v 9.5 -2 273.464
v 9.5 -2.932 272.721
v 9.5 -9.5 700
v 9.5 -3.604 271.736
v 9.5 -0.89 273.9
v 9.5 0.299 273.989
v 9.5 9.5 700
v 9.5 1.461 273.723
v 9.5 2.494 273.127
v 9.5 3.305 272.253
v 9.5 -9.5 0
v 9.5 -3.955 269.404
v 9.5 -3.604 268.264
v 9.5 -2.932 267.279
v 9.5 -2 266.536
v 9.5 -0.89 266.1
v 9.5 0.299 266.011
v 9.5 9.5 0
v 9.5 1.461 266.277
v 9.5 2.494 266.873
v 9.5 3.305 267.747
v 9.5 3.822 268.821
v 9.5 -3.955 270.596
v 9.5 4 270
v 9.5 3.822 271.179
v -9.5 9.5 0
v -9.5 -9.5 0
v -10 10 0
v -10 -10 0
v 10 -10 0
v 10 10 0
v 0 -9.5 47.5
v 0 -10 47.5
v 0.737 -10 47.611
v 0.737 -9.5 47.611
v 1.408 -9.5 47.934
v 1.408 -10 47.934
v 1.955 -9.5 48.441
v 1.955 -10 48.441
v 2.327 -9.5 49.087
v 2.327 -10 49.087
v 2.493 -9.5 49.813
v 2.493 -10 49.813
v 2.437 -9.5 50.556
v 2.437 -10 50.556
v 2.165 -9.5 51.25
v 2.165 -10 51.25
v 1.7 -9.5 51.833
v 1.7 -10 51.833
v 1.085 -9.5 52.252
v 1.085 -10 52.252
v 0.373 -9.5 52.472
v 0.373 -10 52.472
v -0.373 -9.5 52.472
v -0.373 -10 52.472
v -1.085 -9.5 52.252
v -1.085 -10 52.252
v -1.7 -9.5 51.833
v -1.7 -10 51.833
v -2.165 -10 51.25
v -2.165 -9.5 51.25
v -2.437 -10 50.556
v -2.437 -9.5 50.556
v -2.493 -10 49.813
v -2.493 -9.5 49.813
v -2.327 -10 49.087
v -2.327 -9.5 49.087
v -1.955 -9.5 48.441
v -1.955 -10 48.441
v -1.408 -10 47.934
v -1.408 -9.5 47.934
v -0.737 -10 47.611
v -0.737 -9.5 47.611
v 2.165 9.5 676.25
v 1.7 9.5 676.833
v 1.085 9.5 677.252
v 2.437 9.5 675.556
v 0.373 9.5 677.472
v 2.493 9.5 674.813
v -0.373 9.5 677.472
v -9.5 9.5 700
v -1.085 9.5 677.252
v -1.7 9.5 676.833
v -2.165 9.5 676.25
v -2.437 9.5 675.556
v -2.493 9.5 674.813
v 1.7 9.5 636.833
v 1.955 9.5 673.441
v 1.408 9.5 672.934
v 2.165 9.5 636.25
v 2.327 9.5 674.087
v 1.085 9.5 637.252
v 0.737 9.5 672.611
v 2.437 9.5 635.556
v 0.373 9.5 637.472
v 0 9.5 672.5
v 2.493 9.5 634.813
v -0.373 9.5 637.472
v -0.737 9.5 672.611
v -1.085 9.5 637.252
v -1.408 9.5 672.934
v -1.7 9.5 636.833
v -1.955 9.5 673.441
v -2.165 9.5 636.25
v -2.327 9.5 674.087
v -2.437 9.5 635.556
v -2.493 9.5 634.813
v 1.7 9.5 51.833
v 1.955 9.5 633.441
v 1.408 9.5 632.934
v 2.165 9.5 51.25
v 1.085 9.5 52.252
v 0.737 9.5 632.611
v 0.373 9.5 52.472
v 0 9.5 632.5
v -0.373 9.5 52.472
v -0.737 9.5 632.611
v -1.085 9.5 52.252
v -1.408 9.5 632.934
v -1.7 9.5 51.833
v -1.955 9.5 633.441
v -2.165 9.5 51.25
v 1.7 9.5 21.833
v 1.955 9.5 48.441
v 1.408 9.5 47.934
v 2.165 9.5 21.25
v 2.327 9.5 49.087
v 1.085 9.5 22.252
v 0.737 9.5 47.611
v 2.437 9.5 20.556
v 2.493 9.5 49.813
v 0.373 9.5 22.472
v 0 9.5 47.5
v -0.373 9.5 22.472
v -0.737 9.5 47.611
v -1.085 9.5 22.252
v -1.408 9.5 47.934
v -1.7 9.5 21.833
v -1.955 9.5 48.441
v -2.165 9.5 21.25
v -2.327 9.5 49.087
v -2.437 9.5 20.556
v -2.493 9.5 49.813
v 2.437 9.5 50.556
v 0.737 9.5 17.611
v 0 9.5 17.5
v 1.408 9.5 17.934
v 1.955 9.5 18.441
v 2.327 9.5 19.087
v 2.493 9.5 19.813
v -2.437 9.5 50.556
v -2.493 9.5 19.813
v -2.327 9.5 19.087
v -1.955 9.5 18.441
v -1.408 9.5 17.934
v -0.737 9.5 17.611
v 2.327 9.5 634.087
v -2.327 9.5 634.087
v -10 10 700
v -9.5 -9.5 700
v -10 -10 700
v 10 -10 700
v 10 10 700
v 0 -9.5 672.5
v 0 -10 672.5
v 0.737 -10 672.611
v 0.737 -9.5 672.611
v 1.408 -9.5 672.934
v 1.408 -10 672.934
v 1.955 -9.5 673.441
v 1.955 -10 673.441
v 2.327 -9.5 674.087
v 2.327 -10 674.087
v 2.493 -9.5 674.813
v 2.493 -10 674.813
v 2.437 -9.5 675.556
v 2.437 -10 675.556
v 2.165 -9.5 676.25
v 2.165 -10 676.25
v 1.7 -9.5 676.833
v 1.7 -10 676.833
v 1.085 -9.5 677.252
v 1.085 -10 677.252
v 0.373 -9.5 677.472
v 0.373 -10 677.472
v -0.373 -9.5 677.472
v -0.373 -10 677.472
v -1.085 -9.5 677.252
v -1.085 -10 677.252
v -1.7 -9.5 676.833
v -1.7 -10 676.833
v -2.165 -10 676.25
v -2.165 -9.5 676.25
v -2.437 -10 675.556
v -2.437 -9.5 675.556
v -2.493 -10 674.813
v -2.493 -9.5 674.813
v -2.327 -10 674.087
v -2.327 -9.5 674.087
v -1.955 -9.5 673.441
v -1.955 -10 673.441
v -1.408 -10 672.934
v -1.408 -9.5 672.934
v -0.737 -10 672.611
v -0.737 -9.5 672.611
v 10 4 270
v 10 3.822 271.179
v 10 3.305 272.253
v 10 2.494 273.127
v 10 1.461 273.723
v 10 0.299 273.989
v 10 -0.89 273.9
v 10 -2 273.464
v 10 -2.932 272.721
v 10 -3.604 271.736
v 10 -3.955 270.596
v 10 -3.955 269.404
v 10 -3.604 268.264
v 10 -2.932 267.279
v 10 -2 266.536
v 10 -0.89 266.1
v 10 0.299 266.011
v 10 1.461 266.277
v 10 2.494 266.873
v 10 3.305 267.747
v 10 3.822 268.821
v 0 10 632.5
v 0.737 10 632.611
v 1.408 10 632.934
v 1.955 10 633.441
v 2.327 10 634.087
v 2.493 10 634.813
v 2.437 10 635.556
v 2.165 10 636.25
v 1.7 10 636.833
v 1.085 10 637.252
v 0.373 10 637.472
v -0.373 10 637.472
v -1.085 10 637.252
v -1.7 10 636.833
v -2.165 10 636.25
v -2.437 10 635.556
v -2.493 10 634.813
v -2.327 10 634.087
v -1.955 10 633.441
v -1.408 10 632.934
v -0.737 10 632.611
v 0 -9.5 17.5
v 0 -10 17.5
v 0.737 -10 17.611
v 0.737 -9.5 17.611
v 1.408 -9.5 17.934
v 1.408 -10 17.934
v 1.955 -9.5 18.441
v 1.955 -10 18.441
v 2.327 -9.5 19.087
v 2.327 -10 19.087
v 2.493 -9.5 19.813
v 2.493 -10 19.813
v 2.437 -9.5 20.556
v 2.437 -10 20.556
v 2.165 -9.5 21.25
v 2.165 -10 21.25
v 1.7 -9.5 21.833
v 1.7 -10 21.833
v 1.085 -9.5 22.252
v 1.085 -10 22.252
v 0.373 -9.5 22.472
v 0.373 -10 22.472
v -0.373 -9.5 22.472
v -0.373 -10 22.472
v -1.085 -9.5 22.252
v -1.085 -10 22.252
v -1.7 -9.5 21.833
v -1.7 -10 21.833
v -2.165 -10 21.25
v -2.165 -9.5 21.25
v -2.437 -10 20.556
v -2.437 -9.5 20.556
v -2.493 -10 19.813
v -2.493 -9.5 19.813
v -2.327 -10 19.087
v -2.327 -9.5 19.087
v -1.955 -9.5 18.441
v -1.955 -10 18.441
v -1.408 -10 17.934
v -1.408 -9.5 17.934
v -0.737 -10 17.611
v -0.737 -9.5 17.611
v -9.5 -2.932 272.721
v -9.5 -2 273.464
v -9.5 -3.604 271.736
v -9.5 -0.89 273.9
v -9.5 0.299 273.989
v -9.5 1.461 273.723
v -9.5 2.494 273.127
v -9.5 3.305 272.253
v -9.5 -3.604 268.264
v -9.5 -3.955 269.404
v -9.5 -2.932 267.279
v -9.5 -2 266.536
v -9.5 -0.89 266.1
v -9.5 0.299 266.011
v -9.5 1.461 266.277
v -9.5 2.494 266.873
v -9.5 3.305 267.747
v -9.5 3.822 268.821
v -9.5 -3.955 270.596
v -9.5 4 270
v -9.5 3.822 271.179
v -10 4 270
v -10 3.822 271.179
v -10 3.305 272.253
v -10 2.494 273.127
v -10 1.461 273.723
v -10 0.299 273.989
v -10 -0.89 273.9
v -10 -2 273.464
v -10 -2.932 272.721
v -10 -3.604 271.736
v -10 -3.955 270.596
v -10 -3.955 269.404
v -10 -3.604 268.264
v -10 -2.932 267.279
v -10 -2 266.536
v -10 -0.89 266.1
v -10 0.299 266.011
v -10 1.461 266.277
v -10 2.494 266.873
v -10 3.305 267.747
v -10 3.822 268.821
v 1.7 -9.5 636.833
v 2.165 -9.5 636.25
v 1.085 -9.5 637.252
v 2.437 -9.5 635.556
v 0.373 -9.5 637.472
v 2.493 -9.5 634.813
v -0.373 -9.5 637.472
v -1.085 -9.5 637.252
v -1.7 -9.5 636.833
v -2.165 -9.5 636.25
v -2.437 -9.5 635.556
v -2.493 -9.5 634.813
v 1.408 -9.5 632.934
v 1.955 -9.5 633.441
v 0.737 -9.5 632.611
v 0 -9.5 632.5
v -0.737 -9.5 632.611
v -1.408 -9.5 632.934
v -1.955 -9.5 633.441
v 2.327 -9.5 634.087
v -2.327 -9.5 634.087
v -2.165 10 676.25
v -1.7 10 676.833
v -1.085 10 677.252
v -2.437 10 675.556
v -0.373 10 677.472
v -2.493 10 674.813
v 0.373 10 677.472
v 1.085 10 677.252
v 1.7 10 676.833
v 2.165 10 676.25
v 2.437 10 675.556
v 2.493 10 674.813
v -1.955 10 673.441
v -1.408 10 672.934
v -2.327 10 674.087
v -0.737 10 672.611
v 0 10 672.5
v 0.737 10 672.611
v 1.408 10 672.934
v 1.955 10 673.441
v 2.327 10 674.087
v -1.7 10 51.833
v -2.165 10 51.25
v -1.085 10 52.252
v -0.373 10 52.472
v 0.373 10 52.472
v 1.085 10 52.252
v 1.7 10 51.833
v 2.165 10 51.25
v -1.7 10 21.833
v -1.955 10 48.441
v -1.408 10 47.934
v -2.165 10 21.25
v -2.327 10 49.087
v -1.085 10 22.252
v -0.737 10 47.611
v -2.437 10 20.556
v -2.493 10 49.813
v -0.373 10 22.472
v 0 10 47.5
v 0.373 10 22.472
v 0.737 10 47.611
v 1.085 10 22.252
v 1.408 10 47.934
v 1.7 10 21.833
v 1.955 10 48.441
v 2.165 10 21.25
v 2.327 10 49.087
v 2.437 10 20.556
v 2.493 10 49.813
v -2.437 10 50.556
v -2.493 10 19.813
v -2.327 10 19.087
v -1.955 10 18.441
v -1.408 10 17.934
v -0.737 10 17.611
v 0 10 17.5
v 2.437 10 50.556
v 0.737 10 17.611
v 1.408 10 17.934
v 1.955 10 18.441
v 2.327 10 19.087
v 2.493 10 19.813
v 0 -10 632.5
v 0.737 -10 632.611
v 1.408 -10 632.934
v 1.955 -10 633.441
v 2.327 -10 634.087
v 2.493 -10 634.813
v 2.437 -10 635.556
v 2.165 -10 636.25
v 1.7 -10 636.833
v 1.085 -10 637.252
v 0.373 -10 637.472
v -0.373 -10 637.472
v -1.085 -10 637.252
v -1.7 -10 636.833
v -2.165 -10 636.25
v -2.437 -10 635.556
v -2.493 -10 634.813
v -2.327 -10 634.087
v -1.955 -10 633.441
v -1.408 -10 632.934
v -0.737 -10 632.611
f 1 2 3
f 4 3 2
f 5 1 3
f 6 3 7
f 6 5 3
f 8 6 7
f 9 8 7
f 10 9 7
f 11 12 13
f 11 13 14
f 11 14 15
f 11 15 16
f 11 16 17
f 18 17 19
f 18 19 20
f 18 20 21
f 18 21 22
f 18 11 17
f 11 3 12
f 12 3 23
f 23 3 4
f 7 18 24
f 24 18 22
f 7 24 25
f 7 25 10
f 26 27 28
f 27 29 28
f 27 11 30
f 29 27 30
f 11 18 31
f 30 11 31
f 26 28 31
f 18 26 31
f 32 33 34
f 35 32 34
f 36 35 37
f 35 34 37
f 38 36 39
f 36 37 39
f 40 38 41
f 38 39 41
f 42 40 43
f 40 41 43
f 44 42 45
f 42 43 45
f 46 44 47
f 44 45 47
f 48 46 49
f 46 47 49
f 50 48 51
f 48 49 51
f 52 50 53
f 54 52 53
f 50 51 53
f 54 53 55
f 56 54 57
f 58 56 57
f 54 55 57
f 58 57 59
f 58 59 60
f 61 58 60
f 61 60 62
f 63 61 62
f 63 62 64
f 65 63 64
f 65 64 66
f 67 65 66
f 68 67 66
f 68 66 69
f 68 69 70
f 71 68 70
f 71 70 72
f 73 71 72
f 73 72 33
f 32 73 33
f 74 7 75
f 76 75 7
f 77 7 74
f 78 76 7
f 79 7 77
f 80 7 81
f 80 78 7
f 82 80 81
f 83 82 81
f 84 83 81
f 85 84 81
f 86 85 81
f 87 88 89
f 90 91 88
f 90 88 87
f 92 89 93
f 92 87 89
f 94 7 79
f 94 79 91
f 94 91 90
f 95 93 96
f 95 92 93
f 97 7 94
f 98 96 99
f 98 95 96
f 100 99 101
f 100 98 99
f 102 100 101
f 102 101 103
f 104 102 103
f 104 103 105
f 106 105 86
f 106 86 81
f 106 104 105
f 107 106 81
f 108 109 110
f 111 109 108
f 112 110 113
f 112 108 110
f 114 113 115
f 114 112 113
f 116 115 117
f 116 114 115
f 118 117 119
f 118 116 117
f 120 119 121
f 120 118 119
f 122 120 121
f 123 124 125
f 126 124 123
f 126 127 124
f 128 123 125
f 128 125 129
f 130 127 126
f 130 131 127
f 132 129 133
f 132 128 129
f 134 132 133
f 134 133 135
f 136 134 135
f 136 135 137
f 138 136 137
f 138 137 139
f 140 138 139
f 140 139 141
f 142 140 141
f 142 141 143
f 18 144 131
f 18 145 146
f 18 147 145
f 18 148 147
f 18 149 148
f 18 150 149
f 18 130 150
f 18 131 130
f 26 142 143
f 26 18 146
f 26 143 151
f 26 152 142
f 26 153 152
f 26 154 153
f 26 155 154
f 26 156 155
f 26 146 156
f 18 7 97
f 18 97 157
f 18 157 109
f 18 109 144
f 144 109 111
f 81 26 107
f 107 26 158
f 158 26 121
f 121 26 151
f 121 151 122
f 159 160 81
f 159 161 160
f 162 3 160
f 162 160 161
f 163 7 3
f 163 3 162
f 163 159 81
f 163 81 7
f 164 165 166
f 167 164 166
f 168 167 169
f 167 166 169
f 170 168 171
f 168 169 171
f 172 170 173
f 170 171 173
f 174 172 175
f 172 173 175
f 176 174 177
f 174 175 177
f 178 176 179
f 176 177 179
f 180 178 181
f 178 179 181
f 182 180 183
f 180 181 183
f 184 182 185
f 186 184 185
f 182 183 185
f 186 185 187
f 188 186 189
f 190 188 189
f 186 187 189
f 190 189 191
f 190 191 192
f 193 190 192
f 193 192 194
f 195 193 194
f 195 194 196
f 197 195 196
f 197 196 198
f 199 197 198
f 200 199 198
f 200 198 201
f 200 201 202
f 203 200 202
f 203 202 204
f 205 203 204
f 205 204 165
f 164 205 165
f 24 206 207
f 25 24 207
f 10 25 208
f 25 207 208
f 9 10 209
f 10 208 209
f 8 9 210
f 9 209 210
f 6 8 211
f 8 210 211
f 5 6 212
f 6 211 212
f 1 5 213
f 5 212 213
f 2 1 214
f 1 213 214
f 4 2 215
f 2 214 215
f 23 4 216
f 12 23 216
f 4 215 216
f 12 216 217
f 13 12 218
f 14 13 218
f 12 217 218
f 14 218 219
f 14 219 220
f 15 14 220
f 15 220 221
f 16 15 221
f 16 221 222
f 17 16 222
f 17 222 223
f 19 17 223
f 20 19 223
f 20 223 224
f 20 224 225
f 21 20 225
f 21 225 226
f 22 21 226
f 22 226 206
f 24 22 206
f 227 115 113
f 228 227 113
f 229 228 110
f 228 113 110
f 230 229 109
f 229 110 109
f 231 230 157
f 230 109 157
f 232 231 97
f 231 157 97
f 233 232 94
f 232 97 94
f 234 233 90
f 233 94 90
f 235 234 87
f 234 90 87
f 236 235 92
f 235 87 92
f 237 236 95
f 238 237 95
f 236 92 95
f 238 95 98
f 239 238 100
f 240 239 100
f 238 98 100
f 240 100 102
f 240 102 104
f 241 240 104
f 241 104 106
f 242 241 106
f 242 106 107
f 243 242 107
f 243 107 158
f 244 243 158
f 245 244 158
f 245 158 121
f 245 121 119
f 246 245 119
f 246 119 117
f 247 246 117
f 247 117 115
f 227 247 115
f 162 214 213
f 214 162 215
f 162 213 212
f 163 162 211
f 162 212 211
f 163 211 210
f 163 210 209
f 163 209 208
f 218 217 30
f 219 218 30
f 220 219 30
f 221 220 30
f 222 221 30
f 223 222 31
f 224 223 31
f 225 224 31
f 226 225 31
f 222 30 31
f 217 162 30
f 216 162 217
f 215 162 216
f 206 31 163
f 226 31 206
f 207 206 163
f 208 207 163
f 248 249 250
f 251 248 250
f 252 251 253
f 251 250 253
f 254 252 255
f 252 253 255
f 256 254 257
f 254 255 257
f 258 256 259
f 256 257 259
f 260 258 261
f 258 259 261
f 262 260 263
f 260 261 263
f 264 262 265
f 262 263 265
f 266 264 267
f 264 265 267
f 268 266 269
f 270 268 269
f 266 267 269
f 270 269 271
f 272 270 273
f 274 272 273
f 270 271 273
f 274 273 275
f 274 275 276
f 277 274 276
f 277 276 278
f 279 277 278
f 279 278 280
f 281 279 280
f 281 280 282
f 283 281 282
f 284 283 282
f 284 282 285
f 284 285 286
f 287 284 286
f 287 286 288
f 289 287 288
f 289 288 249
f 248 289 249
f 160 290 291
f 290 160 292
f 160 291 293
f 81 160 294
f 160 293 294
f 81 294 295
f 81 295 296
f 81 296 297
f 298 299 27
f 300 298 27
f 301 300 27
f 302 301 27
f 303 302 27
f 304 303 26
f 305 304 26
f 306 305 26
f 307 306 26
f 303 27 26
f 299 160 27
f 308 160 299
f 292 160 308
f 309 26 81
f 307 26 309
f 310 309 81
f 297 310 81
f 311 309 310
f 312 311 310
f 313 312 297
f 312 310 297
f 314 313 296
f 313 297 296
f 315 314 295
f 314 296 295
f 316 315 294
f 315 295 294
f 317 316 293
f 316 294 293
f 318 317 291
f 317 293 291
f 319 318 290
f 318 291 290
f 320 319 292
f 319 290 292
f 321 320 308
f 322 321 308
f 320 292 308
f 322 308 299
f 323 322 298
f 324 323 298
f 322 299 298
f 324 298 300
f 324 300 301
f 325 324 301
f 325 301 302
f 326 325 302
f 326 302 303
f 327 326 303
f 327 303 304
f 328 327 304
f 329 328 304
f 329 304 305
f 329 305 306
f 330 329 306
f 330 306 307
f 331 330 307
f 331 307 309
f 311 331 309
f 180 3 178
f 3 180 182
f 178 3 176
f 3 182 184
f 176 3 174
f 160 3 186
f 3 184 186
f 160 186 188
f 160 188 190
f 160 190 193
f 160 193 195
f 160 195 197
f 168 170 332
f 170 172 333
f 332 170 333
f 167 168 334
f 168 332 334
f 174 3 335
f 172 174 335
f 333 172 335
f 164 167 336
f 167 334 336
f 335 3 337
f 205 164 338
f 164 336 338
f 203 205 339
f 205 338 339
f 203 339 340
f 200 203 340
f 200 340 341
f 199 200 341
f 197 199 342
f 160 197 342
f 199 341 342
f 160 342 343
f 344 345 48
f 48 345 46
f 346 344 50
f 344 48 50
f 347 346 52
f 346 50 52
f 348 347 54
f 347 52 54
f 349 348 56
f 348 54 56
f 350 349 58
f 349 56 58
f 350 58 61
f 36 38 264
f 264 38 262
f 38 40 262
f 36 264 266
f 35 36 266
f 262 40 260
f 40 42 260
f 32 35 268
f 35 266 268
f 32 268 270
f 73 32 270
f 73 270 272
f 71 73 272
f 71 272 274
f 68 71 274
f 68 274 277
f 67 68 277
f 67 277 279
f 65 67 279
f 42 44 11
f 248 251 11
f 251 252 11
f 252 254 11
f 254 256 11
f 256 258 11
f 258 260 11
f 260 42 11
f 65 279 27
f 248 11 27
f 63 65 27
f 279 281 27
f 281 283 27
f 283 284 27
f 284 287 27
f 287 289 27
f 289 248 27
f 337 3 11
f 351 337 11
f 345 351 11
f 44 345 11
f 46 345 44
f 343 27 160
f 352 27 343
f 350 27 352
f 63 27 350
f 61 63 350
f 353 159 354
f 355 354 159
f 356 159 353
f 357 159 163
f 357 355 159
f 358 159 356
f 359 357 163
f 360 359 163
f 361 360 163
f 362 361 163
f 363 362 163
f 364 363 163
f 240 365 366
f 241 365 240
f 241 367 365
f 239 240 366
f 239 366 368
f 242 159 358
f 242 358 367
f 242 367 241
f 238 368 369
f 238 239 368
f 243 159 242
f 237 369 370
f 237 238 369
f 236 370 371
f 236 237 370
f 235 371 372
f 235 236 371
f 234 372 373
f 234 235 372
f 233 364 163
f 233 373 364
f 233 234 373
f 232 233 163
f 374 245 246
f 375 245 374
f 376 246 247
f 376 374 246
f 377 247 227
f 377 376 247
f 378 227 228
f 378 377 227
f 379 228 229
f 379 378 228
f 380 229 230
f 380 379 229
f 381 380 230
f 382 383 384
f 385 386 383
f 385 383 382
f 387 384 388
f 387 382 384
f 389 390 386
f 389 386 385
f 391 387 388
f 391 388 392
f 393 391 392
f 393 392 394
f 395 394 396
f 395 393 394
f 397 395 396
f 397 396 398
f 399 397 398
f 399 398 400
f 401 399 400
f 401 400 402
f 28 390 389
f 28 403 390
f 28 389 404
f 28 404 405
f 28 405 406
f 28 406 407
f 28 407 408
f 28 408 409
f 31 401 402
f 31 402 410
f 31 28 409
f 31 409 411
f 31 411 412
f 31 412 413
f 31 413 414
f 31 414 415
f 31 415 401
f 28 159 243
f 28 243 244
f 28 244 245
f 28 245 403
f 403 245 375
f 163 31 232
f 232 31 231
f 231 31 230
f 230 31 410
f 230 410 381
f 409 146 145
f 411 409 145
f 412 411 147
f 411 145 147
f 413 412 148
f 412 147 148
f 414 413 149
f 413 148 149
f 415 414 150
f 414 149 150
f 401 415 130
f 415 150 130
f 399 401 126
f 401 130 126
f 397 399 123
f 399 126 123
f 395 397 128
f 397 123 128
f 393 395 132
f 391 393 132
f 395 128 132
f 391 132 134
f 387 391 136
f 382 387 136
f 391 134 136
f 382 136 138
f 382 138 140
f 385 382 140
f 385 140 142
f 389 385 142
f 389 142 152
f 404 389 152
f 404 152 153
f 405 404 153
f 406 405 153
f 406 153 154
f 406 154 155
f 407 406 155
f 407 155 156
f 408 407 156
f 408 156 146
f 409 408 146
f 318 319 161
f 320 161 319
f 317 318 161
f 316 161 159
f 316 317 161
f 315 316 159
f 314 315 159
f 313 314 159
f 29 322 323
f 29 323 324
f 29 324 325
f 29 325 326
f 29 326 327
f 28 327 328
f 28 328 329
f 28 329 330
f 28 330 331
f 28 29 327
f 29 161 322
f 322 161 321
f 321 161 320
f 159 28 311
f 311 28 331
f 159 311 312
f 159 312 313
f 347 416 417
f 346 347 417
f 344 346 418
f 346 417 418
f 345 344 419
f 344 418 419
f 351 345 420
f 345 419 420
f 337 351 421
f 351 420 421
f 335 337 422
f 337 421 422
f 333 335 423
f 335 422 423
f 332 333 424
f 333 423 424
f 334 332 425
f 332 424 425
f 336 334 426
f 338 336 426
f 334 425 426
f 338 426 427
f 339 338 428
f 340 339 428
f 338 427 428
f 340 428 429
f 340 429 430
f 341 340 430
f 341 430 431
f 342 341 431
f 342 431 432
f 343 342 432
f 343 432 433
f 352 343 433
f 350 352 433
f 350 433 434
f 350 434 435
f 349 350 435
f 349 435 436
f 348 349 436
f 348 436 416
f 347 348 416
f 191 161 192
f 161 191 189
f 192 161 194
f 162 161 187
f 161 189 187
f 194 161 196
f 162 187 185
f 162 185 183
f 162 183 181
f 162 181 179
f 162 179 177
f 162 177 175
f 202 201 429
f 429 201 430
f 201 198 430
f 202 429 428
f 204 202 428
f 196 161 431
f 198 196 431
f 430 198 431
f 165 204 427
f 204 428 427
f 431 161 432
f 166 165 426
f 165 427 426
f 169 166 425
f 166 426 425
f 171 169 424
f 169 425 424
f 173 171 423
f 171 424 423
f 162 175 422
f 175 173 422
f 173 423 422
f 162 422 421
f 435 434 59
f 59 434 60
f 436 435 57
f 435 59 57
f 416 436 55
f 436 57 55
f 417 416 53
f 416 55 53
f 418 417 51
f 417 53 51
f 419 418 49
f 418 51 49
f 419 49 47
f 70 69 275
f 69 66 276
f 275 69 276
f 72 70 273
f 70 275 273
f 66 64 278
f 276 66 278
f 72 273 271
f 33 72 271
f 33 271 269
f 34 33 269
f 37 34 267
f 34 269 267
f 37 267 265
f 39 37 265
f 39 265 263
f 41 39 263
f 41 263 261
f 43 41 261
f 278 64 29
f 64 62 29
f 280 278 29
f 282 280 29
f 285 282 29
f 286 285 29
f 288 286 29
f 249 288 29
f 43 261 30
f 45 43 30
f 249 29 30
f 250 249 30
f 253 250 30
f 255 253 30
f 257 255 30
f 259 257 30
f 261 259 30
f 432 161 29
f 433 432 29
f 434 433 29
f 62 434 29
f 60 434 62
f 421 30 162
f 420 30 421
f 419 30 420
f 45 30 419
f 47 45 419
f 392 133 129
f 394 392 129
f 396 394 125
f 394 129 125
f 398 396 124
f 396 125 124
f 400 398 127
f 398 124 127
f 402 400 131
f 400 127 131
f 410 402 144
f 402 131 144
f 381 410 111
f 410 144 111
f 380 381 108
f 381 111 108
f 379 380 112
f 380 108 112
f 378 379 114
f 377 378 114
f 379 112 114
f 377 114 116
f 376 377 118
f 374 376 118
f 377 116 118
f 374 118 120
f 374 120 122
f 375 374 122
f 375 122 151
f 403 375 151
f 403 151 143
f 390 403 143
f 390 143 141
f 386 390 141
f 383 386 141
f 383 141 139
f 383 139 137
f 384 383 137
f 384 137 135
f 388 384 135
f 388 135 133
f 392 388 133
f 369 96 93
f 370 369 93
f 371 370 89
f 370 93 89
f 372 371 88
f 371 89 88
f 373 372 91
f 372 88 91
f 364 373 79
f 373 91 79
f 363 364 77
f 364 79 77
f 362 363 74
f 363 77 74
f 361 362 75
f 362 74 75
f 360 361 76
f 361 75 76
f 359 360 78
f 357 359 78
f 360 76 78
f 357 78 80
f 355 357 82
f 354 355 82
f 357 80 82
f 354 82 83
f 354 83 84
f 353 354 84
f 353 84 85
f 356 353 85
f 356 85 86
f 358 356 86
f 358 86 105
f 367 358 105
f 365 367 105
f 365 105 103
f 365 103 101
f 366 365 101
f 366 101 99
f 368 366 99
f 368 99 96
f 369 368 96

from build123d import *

# Parameters (mm, degrees)
SKETCH2_W           = 20
SKETCH2_H           = 20
BOSS_EXTRUDE1_DEPTH = 700
SKETCH3_W           = 19
SKETCH3_H           = 19
CUT_EXTRUDE1_DEPTH  = 700
SKETCH5_R           = 2.5
CUT_EXTRUDE2_DEPTH  = 20
SKETCH6_R           = 4
CUT_EXTRUDE3_DEPTH  = 20
SKETCH7_R           = 2.5
CUT_EXTRUDE4_DEPTH  = 20


with BuildPart() as part:
    # Sketch2 → Boss-Extrude1 (new body)
    with BuildSketch(Plane.XY):
        Rectangle(SKETCH2_W, SKETCH2_H)
    extrude(amount=BOSS_EXTRUDE1_DEPTH)

    # Sketch3 → Cut-Extrude1 (cut)
    with BuildSketch(Plane(origin=(0, 0, 0), x_dir=(-1, 0, 0), z_dir=(0, 0, -1))):
        Rectangle(SKETCH3_W, SKETCH3_H)
    extrude(amount=-CUT_EXTRUDE1_DEPTH, mode=Mode.SUBTRACT)

    # Sketch5 → Cut-Extrude2 (cut)
    with BuildSketch(Plane.XZ.offset(10)):
        with Locations(Location((0, 635, 0), (0, 0, 270))):
            Circle(SKETCH5_R)
        with Locations(Location((0, 675, 0), (0, 0, 270))):
            Circle(SKETCH5_R)
    extrude(amount=-CUT_EXTRUDE2_DEPTH, mode=Mode.SUBTRACT)

    # Sketch6 → Cut-Extrude3 (cut)
    with BuildSketch(Plane(origin=(10, 0, 0), x_dir=(0, 0, -1), z_dir=(1, 0, 0))):
        with Locations(Location((-270, 0, 0), (0, 0, 90))):
            Circle(SKETCH6_R)
    extrude(amount=-CUT_EXTRUDE3_DEPTH, mode=Mode.SUBTRACT)

    # Sketch7 → Cut-Extrude4 (cut)
    with BuildSketch(Plane.XZ.offset(10)):
        with Locations(Location((0, 20, 0), (0, 0, 270))):
            Circle(SKETCH7_R)
        with Locations(Location((0, 50, 0), (0, 0, 270))):
            Circle(SKETCH7_R)
    extrude(amount=-CUT_EXTRUDE4_DEPTH, mode=Mode.SUBTRACT)


solid = part.part
